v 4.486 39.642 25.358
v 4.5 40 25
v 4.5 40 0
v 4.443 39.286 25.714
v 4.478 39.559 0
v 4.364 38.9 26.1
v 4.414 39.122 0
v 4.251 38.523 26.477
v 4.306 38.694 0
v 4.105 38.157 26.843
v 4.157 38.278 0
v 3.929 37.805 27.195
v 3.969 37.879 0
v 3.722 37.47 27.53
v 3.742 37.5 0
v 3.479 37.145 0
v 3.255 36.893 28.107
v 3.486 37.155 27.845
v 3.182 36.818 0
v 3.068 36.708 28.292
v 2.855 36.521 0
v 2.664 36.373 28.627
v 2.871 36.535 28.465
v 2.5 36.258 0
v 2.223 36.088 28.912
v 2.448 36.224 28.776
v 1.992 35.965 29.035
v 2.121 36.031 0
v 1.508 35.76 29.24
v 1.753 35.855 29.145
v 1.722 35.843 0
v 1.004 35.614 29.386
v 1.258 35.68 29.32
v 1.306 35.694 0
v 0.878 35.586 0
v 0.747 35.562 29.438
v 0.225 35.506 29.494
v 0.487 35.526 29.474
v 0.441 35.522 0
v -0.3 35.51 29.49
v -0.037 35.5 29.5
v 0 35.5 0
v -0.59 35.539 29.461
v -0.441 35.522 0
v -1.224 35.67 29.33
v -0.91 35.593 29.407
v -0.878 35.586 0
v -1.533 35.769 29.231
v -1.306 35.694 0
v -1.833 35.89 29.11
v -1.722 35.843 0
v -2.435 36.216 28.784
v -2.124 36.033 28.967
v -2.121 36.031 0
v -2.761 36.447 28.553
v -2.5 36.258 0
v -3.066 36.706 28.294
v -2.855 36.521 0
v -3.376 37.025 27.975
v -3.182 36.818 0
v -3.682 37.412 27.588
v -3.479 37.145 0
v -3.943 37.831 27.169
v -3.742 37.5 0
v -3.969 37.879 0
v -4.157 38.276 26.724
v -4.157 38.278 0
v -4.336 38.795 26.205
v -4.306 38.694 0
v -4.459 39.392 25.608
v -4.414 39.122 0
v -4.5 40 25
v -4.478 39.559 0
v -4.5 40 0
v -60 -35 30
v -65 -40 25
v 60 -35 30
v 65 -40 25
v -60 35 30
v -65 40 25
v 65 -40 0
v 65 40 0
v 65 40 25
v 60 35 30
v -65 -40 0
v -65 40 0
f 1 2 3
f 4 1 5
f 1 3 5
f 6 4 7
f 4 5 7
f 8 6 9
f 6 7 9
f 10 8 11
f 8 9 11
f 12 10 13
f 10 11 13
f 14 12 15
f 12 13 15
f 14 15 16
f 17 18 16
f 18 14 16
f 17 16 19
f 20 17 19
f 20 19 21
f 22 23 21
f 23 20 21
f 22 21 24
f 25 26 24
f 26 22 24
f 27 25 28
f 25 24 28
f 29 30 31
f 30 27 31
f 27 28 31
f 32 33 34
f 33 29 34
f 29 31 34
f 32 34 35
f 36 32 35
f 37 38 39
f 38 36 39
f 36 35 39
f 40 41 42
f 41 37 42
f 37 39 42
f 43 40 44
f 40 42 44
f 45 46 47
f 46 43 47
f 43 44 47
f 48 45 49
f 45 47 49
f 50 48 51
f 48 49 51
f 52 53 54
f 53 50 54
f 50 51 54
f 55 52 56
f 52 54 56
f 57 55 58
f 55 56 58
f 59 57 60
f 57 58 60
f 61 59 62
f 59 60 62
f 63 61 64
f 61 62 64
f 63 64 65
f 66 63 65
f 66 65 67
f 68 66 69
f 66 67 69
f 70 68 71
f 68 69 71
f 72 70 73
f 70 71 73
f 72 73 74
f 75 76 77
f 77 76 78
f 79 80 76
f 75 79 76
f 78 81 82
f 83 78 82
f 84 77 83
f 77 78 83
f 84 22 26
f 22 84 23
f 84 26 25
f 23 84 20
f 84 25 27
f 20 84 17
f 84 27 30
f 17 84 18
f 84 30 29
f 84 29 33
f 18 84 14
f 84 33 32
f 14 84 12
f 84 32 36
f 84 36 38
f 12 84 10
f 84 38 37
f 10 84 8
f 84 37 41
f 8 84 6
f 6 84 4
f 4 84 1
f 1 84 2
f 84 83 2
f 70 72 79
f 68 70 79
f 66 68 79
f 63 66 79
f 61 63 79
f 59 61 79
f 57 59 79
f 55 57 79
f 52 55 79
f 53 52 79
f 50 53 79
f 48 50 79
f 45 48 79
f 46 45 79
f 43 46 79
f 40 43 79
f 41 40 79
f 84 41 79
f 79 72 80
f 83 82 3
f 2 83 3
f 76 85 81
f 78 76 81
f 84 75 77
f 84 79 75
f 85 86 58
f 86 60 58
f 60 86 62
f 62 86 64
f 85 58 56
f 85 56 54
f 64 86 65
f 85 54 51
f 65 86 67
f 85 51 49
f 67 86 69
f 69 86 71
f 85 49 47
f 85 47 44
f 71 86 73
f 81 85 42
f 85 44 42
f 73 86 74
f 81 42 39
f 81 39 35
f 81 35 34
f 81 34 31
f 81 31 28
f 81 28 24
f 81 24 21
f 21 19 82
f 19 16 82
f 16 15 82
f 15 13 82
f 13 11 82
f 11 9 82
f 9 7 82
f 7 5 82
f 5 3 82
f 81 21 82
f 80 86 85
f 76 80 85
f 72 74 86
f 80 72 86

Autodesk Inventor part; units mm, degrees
ref_plane "YZ Plane" through (0, 0, 0) normal (1, 0, 0) x (0, 1, 0)
ref_plane "XZ Plane" through (0, 0, 0) normal (0, 1, 0) x (-1, 0, 0)
ref_plane "XY Plane" through (0, 0, 0) normal (0, 0, 1) x (1, 0, 0)
sketch "Sketch1" plane through (0, 0, 0) normal (0, 0, 1) x (1, 0, 0)
  line L0 (-65, -40) -> (65, -40)
  line L1 (65, -40) -> (65, 40)
  line L2 (65, 40) -> (-65, 40)
  line L3 (-65, 40) -> (-65, -40)
  line L4 (-65, -40) -> (65, 40) construction
  line L5 (65, -40) -> (-65, 40) construction
  point P0 (0, 0)
  dimension "d0" = 80
  dimension "d1" = 130
extrude "Extrusion1" add sketch "Sketch1" along normal blind 30
sketch "Sketch2" plane through (0, 0, 30) normal (0, 0, 1) x (1, 0, 0)
  line L0 (-65, -40) -> (65, -40) projected
  line L1 (65, -40) -> (65, 40) projected
  line L2 (65, 40) -> (-65, 40) projected
  point P0 (0, 0)
  point P1 (0, 40)
hole "Hole1" at (0, 40, 30) direction (0, 0, -1) diameter 9 depth 30
chamfer "Chamfer1" distance 5 angle 45 5 edges at (34.75, 40, 30) (-34.75, 40, 30) (65, 0, 30) (0, -40, 30) (-65, 0, 30)
properties part number "block"
